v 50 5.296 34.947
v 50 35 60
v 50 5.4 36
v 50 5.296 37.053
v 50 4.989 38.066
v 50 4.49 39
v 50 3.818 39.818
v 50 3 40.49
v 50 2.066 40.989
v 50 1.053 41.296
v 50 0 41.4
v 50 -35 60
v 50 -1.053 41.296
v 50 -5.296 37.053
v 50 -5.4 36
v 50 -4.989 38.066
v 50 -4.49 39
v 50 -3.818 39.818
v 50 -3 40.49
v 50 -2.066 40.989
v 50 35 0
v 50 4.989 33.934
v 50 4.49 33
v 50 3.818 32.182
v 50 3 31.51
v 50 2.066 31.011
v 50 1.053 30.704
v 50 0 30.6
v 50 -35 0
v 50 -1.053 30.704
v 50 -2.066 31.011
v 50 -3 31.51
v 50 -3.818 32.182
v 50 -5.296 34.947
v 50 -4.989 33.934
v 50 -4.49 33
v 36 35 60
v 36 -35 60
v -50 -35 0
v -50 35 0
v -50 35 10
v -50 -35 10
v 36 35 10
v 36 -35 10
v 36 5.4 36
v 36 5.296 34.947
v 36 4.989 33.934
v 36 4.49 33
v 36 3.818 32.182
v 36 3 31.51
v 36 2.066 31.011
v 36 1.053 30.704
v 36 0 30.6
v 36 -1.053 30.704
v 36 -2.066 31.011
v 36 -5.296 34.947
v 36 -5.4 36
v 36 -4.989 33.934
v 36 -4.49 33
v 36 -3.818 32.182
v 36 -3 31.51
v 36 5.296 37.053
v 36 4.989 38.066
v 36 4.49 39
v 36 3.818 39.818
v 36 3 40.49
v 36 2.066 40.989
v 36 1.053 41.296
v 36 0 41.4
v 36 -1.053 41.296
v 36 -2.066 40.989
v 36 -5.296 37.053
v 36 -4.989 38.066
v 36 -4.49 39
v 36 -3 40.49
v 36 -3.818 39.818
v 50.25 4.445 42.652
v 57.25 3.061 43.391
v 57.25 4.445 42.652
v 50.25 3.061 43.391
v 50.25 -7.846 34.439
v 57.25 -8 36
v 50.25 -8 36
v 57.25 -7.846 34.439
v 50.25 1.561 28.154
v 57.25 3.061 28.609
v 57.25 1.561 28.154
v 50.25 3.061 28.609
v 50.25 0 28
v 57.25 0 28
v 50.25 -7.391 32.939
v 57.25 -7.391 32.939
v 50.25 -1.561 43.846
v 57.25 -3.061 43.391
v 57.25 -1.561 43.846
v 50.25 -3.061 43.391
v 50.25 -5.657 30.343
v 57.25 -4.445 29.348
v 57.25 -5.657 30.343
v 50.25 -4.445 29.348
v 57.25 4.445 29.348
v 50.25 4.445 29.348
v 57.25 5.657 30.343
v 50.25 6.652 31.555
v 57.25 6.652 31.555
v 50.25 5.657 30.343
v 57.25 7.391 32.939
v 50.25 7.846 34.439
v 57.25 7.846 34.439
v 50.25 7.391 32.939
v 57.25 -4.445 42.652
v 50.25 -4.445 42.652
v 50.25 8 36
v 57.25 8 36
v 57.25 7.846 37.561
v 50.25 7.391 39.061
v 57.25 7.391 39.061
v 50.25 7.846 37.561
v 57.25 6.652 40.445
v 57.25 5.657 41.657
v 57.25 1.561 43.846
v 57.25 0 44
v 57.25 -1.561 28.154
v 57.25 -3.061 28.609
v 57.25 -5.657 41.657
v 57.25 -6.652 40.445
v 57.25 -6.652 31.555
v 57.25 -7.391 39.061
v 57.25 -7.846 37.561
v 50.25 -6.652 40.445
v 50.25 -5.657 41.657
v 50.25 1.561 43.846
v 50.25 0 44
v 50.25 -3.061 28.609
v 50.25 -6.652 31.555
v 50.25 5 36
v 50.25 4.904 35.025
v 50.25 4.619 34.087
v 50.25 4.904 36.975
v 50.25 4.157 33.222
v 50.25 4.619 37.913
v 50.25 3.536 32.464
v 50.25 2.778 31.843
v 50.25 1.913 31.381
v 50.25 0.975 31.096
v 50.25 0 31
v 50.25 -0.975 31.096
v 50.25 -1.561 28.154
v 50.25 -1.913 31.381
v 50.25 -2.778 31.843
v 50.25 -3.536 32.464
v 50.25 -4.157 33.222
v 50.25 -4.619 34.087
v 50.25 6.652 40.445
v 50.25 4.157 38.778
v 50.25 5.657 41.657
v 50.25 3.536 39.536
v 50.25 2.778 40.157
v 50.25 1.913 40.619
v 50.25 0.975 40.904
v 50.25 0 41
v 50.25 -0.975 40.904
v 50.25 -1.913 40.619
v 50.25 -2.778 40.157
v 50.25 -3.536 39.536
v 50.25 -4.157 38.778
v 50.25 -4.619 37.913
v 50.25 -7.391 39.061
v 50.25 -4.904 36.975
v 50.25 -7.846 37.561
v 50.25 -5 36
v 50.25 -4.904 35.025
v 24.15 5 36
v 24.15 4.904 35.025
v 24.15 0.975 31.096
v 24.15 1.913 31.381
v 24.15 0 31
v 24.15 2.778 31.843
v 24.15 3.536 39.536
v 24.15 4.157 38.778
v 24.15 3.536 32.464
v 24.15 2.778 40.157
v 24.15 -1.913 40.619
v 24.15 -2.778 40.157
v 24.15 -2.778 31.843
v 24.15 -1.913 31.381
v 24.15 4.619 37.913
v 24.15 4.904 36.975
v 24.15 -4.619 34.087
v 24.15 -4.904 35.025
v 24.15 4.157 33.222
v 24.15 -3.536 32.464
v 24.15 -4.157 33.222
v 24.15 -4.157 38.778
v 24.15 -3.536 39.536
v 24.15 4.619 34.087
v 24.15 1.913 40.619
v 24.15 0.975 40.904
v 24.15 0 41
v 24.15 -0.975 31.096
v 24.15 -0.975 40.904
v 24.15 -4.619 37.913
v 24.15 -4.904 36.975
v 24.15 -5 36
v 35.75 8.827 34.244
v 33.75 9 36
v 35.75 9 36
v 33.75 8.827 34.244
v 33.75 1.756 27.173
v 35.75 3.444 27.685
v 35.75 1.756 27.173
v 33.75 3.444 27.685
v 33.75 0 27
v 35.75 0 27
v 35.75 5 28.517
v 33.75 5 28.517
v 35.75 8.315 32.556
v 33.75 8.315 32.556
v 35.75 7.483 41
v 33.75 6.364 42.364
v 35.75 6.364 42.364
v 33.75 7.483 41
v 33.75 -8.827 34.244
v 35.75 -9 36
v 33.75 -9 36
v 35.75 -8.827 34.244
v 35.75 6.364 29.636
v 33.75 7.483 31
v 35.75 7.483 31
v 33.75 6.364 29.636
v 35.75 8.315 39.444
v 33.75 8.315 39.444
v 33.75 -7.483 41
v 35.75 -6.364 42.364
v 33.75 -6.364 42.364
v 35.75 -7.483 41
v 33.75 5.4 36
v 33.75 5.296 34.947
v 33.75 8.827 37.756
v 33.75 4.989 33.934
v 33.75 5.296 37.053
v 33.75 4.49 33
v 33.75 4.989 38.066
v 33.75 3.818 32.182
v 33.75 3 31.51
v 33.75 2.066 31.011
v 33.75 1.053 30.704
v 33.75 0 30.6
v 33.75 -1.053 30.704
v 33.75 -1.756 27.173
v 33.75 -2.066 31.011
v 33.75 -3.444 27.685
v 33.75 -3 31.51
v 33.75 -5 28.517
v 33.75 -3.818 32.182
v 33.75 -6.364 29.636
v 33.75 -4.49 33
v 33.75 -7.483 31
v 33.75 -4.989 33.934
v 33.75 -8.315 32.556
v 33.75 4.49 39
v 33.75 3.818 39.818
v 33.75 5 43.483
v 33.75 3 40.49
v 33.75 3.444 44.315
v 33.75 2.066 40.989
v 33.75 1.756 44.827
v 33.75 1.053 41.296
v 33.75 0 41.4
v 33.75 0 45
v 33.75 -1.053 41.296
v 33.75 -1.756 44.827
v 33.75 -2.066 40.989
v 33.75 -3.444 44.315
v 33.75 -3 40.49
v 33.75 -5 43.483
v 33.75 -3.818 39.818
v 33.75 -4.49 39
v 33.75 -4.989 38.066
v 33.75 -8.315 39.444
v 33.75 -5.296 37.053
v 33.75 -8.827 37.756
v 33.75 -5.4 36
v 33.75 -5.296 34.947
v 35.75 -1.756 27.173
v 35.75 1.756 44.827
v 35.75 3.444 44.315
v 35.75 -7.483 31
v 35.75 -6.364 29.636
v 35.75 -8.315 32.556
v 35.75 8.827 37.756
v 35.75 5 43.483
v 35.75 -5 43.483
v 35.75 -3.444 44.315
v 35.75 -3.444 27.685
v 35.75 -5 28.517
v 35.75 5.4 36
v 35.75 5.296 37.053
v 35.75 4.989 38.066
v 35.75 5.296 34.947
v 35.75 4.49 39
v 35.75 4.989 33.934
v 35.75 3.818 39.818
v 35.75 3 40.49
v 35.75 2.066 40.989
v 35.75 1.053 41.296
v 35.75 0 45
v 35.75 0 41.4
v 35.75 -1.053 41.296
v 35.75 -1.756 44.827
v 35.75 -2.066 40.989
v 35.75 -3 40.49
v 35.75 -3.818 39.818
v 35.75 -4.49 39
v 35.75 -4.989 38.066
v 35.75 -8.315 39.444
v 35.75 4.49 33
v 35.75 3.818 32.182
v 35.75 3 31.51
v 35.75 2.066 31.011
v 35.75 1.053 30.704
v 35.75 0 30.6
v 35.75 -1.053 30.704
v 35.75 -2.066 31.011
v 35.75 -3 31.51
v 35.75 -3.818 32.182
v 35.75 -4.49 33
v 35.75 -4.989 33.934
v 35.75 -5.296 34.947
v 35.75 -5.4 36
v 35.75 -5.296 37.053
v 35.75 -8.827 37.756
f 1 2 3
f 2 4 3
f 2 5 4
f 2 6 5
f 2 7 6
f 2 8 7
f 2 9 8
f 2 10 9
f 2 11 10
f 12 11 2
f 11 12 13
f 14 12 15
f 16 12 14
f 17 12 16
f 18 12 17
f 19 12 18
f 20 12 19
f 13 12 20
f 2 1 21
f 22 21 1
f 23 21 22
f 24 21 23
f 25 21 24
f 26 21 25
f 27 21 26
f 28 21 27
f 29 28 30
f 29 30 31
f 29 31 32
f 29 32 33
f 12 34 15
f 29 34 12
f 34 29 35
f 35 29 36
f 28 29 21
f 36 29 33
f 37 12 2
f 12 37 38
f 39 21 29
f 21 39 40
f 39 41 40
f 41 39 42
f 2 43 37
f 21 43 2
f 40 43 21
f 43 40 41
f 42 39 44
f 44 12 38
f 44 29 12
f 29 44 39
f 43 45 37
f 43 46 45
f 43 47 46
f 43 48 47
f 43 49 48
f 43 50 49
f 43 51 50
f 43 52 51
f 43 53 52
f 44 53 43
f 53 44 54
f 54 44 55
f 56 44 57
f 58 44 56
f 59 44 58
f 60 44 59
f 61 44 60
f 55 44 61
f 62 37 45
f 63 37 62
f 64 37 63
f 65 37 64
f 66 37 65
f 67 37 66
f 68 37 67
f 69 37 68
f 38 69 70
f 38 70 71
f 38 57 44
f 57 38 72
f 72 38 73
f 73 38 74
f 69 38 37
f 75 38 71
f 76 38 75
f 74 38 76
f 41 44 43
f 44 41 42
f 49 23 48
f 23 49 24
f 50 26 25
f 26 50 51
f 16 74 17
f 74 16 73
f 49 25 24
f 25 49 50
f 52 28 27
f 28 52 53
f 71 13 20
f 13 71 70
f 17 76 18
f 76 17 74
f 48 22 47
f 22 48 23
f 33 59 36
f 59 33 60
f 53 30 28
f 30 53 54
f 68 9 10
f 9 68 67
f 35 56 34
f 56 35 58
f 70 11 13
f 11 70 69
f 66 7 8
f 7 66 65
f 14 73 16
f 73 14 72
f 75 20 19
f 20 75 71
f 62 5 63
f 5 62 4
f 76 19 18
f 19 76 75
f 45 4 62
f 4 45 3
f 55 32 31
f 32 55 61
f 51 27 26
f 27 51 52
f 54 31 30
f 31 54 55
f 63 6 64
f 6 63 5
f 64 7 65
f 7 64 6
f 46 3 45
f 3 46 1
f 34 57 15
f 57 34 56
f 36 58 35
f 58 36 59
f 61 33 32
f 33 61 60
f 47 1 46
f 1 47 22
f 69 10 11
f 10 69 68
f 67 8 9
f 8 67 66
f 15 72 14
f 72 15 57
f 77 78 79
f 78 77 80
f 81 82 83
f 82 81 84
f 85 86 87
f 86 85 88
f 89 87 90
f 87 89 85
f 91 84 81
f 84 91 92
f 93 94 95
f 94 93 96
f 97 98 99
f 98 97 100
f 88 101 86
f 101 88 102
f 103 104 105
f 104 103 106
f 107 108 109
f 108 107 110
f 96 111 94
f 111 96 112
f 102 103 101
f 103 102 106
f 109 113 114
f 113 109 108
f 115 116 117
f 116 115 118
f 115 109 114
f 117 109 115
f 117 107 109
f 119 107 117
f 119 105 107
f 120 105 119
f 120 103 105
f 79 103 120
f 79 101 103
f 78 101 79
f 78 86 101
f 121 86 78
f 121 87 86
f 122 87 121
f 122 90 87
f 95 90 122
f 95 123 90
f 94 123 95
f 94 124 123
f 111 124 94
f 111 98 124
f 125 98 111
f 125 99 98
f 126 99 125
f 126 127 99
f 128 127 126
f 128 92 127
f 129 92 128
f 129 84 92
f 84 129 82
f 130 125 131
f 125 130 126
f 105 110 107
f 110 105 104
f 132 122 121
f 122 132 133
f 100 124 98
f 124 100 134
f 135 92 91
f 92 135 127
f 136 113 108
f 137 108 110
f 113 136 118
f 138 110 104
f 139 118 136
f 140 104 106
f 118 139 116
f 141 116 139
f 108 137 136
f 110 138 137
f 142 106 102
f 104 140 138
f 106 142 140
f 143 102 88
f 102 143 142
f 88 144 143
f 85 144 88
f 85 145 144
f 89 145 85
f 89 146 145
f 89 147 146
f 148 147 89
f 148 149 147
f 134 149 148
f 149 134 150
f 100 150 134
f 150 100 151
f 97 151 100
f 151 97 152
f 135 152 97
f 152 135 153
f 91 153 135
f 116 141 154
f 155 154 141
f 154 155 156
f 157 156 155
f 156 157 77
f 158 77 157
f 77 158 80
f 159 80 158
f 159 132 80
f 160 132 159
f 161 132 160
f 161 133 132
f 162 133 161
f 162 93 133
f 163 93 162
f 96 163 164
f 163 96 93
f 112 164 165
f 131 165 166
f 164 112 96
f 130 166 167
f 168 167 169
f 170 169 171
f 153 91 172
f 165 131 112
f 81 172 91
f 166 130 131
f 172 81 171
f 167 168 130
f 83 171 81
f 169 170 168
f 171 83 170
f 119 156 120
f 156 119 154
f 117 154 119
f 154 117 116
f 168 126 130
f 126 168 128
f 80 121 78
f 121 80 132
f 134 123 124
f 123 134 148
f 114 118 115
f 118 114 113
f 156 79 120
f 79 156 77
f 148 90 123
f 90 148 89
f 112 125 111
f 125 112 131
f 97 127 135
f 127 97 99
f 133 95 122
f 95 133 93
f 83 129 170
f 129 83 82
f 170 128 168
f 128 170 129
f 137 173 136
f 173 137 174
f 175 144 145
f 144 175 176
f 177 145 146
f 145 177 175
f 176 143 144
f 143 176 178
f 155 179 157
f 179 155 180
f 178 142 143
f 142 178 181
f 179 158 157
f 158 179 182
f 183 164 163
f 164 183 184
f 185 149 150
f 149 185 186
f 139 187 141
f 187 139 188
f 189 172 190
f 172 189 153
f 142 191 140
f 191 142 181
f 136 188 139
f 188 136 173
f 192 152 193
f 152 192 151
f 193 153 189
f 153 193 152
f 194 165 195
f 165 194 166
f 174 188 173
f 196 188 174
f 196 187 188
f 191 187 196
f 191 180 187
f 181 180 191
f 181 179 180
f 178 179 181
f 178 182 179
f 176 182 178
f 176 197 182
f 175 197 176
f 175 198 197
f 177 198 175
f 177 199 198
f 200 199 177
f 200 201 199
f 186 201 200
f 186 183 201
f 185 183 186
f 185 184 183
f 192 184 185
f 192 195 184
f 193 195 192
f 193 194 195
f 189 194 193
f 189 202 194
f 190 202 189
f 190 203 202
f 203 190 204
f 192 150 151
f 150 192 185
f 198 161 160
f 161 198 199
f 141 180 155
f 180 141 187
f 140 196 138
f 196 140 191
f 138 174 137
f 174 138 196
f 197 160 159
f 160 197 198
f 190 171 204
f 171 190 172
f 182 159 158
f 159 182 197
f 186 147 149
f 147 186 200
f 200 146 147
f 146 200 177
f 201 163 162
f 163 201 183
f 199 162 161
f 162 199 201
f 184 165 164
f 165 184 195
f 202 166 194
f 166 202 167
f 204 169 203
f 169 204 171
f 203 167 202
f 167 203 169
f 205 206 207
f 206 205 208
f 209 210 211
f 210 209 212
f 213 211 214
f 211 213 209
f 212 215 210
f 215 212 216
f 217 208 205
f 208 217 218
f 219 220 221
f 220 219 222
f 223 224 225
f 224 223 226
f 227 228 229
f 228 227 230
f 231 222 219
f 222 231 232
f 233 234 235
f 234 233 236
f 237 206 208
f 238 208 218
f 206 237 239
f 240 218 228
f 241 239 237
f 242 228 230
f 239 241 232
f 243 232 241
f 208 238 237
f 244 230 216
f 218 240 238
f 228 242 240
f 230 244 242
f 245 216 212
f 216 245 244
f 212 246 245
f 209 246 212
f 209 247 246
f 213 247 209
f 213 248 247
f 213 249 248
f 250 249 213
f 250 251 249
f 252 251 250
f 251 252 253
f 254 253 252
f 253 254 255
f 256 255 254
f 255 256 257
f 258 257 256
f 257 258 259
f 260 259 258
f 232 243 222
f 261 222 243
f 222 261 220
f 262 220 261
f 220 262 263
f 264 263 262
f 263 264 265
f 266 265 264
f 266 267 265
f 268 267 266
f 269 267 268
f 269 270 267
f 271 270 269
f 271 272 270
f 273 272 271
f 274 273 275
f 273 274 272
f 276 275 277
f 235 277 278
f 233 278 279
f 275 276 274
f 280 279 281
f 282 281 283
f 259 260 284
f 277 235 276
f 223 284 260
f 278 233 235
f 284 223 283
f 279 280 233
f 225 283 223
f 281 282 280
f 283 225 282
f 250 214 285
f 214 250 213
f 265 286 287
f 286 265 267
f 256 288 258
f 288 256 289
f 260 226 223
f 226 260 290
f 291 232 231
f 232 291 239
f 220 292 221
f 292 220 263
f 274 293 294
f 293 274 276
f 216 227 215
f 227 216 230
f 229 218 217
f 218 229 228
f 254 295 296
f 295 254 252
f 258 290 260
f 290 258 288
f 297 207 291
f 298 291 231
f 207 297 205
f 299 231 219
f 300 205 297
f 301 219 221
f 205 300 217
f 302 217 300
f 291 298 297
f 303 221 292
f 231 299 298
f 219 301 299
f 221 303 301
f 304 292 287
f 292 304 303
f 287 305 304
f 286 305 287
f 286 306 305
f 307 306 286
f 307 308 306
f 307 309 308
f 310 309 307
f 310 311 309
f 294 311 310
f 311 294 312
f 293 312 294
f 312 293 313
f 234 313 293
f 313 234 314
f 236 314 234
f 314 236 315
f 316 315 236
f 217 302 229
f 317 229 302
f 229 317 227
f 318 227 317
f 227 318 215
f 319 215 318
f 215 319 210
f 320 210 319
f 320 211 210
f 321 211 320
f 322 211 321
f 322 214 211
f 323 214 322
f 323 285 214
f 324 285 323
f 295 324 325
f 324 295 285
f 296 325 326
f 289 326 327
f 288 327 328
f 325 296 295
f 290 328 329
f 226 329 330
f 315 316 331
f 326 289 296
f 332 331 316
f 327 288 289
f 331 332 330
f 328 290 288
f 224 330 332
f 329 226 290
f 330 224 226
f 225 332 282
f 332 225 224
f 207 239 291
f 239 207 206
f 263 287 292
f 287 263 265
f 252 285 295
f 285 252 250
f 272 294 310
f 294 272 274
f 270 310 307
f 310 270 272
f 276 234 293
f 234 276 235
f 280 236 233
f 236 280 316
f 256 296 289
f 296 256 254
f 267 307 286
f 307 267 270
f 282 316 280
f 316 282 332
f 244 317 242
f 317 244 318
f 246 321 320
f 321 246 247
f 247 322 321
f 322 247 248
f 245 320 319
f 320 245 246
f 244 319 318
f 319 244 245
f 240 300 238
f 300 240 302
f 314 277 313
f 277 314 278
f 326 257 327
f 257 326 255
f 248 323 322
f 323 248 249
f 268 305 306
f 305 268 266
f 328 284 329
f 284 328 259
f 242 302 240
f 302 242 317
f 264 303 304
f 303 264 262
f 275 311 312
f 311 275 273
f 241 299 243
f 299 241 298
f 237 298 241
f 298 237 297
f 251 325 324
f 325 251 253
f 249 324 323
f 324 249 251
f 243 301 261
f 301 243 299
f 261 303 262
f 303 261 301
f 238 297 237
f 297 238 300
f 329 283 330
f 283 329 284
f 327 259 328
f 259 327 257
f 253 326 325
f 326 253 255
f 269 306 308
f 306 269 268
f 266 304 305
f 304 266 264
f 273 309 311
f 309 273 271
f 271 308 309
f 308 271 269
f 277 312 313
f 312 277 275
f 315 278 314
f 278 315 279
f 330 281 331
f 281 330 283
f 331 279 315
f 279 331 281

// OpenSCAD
$fn = 32;

// ------------------------------------------------------------------------
// Bolted bracket: 100 x 70 mm bracket with 1 bolt joints
// Every part is its own module, assembly() places them once.
// ------------------------------------------------------------------------

// --- part 1 ---
module bracket() {
  difference() {
    translate([-50, -35, 0]) cube([100, 70, 60]);
    translate([-51, -36, 10]) cube([87, 72, 51]);
    translate([43, 0, 36]) rotate([0, 90, 0]) cylinder(h = 16, d = 10.8, center = true);
  }
}

// --- part 2 ---
module bolt() {
  cylinder(h = 7, d = 16);
  translate([0, 0, -26.1]) cylinder(h = 26.1, d = 10);
}

// --- part 3 ---
module washer() {
  difference() {
      translate([0, 0, 0]) cylinder(h = 2, d = 18);
      translate([0, 0, -1]) cylinder(h = 4, d = 10.8);
    }
}

// --- assembly ---
module assembly() {
  translate([0, 0, 0]) rotate([0, 0, 0]) bracket();
  translate([50.25, 0, 36]) rotate([0, 90, 0]) bolt();
  translate([33.75, 0, 36]) rotate([0, 90, 0]) washer();
}

assembly();
